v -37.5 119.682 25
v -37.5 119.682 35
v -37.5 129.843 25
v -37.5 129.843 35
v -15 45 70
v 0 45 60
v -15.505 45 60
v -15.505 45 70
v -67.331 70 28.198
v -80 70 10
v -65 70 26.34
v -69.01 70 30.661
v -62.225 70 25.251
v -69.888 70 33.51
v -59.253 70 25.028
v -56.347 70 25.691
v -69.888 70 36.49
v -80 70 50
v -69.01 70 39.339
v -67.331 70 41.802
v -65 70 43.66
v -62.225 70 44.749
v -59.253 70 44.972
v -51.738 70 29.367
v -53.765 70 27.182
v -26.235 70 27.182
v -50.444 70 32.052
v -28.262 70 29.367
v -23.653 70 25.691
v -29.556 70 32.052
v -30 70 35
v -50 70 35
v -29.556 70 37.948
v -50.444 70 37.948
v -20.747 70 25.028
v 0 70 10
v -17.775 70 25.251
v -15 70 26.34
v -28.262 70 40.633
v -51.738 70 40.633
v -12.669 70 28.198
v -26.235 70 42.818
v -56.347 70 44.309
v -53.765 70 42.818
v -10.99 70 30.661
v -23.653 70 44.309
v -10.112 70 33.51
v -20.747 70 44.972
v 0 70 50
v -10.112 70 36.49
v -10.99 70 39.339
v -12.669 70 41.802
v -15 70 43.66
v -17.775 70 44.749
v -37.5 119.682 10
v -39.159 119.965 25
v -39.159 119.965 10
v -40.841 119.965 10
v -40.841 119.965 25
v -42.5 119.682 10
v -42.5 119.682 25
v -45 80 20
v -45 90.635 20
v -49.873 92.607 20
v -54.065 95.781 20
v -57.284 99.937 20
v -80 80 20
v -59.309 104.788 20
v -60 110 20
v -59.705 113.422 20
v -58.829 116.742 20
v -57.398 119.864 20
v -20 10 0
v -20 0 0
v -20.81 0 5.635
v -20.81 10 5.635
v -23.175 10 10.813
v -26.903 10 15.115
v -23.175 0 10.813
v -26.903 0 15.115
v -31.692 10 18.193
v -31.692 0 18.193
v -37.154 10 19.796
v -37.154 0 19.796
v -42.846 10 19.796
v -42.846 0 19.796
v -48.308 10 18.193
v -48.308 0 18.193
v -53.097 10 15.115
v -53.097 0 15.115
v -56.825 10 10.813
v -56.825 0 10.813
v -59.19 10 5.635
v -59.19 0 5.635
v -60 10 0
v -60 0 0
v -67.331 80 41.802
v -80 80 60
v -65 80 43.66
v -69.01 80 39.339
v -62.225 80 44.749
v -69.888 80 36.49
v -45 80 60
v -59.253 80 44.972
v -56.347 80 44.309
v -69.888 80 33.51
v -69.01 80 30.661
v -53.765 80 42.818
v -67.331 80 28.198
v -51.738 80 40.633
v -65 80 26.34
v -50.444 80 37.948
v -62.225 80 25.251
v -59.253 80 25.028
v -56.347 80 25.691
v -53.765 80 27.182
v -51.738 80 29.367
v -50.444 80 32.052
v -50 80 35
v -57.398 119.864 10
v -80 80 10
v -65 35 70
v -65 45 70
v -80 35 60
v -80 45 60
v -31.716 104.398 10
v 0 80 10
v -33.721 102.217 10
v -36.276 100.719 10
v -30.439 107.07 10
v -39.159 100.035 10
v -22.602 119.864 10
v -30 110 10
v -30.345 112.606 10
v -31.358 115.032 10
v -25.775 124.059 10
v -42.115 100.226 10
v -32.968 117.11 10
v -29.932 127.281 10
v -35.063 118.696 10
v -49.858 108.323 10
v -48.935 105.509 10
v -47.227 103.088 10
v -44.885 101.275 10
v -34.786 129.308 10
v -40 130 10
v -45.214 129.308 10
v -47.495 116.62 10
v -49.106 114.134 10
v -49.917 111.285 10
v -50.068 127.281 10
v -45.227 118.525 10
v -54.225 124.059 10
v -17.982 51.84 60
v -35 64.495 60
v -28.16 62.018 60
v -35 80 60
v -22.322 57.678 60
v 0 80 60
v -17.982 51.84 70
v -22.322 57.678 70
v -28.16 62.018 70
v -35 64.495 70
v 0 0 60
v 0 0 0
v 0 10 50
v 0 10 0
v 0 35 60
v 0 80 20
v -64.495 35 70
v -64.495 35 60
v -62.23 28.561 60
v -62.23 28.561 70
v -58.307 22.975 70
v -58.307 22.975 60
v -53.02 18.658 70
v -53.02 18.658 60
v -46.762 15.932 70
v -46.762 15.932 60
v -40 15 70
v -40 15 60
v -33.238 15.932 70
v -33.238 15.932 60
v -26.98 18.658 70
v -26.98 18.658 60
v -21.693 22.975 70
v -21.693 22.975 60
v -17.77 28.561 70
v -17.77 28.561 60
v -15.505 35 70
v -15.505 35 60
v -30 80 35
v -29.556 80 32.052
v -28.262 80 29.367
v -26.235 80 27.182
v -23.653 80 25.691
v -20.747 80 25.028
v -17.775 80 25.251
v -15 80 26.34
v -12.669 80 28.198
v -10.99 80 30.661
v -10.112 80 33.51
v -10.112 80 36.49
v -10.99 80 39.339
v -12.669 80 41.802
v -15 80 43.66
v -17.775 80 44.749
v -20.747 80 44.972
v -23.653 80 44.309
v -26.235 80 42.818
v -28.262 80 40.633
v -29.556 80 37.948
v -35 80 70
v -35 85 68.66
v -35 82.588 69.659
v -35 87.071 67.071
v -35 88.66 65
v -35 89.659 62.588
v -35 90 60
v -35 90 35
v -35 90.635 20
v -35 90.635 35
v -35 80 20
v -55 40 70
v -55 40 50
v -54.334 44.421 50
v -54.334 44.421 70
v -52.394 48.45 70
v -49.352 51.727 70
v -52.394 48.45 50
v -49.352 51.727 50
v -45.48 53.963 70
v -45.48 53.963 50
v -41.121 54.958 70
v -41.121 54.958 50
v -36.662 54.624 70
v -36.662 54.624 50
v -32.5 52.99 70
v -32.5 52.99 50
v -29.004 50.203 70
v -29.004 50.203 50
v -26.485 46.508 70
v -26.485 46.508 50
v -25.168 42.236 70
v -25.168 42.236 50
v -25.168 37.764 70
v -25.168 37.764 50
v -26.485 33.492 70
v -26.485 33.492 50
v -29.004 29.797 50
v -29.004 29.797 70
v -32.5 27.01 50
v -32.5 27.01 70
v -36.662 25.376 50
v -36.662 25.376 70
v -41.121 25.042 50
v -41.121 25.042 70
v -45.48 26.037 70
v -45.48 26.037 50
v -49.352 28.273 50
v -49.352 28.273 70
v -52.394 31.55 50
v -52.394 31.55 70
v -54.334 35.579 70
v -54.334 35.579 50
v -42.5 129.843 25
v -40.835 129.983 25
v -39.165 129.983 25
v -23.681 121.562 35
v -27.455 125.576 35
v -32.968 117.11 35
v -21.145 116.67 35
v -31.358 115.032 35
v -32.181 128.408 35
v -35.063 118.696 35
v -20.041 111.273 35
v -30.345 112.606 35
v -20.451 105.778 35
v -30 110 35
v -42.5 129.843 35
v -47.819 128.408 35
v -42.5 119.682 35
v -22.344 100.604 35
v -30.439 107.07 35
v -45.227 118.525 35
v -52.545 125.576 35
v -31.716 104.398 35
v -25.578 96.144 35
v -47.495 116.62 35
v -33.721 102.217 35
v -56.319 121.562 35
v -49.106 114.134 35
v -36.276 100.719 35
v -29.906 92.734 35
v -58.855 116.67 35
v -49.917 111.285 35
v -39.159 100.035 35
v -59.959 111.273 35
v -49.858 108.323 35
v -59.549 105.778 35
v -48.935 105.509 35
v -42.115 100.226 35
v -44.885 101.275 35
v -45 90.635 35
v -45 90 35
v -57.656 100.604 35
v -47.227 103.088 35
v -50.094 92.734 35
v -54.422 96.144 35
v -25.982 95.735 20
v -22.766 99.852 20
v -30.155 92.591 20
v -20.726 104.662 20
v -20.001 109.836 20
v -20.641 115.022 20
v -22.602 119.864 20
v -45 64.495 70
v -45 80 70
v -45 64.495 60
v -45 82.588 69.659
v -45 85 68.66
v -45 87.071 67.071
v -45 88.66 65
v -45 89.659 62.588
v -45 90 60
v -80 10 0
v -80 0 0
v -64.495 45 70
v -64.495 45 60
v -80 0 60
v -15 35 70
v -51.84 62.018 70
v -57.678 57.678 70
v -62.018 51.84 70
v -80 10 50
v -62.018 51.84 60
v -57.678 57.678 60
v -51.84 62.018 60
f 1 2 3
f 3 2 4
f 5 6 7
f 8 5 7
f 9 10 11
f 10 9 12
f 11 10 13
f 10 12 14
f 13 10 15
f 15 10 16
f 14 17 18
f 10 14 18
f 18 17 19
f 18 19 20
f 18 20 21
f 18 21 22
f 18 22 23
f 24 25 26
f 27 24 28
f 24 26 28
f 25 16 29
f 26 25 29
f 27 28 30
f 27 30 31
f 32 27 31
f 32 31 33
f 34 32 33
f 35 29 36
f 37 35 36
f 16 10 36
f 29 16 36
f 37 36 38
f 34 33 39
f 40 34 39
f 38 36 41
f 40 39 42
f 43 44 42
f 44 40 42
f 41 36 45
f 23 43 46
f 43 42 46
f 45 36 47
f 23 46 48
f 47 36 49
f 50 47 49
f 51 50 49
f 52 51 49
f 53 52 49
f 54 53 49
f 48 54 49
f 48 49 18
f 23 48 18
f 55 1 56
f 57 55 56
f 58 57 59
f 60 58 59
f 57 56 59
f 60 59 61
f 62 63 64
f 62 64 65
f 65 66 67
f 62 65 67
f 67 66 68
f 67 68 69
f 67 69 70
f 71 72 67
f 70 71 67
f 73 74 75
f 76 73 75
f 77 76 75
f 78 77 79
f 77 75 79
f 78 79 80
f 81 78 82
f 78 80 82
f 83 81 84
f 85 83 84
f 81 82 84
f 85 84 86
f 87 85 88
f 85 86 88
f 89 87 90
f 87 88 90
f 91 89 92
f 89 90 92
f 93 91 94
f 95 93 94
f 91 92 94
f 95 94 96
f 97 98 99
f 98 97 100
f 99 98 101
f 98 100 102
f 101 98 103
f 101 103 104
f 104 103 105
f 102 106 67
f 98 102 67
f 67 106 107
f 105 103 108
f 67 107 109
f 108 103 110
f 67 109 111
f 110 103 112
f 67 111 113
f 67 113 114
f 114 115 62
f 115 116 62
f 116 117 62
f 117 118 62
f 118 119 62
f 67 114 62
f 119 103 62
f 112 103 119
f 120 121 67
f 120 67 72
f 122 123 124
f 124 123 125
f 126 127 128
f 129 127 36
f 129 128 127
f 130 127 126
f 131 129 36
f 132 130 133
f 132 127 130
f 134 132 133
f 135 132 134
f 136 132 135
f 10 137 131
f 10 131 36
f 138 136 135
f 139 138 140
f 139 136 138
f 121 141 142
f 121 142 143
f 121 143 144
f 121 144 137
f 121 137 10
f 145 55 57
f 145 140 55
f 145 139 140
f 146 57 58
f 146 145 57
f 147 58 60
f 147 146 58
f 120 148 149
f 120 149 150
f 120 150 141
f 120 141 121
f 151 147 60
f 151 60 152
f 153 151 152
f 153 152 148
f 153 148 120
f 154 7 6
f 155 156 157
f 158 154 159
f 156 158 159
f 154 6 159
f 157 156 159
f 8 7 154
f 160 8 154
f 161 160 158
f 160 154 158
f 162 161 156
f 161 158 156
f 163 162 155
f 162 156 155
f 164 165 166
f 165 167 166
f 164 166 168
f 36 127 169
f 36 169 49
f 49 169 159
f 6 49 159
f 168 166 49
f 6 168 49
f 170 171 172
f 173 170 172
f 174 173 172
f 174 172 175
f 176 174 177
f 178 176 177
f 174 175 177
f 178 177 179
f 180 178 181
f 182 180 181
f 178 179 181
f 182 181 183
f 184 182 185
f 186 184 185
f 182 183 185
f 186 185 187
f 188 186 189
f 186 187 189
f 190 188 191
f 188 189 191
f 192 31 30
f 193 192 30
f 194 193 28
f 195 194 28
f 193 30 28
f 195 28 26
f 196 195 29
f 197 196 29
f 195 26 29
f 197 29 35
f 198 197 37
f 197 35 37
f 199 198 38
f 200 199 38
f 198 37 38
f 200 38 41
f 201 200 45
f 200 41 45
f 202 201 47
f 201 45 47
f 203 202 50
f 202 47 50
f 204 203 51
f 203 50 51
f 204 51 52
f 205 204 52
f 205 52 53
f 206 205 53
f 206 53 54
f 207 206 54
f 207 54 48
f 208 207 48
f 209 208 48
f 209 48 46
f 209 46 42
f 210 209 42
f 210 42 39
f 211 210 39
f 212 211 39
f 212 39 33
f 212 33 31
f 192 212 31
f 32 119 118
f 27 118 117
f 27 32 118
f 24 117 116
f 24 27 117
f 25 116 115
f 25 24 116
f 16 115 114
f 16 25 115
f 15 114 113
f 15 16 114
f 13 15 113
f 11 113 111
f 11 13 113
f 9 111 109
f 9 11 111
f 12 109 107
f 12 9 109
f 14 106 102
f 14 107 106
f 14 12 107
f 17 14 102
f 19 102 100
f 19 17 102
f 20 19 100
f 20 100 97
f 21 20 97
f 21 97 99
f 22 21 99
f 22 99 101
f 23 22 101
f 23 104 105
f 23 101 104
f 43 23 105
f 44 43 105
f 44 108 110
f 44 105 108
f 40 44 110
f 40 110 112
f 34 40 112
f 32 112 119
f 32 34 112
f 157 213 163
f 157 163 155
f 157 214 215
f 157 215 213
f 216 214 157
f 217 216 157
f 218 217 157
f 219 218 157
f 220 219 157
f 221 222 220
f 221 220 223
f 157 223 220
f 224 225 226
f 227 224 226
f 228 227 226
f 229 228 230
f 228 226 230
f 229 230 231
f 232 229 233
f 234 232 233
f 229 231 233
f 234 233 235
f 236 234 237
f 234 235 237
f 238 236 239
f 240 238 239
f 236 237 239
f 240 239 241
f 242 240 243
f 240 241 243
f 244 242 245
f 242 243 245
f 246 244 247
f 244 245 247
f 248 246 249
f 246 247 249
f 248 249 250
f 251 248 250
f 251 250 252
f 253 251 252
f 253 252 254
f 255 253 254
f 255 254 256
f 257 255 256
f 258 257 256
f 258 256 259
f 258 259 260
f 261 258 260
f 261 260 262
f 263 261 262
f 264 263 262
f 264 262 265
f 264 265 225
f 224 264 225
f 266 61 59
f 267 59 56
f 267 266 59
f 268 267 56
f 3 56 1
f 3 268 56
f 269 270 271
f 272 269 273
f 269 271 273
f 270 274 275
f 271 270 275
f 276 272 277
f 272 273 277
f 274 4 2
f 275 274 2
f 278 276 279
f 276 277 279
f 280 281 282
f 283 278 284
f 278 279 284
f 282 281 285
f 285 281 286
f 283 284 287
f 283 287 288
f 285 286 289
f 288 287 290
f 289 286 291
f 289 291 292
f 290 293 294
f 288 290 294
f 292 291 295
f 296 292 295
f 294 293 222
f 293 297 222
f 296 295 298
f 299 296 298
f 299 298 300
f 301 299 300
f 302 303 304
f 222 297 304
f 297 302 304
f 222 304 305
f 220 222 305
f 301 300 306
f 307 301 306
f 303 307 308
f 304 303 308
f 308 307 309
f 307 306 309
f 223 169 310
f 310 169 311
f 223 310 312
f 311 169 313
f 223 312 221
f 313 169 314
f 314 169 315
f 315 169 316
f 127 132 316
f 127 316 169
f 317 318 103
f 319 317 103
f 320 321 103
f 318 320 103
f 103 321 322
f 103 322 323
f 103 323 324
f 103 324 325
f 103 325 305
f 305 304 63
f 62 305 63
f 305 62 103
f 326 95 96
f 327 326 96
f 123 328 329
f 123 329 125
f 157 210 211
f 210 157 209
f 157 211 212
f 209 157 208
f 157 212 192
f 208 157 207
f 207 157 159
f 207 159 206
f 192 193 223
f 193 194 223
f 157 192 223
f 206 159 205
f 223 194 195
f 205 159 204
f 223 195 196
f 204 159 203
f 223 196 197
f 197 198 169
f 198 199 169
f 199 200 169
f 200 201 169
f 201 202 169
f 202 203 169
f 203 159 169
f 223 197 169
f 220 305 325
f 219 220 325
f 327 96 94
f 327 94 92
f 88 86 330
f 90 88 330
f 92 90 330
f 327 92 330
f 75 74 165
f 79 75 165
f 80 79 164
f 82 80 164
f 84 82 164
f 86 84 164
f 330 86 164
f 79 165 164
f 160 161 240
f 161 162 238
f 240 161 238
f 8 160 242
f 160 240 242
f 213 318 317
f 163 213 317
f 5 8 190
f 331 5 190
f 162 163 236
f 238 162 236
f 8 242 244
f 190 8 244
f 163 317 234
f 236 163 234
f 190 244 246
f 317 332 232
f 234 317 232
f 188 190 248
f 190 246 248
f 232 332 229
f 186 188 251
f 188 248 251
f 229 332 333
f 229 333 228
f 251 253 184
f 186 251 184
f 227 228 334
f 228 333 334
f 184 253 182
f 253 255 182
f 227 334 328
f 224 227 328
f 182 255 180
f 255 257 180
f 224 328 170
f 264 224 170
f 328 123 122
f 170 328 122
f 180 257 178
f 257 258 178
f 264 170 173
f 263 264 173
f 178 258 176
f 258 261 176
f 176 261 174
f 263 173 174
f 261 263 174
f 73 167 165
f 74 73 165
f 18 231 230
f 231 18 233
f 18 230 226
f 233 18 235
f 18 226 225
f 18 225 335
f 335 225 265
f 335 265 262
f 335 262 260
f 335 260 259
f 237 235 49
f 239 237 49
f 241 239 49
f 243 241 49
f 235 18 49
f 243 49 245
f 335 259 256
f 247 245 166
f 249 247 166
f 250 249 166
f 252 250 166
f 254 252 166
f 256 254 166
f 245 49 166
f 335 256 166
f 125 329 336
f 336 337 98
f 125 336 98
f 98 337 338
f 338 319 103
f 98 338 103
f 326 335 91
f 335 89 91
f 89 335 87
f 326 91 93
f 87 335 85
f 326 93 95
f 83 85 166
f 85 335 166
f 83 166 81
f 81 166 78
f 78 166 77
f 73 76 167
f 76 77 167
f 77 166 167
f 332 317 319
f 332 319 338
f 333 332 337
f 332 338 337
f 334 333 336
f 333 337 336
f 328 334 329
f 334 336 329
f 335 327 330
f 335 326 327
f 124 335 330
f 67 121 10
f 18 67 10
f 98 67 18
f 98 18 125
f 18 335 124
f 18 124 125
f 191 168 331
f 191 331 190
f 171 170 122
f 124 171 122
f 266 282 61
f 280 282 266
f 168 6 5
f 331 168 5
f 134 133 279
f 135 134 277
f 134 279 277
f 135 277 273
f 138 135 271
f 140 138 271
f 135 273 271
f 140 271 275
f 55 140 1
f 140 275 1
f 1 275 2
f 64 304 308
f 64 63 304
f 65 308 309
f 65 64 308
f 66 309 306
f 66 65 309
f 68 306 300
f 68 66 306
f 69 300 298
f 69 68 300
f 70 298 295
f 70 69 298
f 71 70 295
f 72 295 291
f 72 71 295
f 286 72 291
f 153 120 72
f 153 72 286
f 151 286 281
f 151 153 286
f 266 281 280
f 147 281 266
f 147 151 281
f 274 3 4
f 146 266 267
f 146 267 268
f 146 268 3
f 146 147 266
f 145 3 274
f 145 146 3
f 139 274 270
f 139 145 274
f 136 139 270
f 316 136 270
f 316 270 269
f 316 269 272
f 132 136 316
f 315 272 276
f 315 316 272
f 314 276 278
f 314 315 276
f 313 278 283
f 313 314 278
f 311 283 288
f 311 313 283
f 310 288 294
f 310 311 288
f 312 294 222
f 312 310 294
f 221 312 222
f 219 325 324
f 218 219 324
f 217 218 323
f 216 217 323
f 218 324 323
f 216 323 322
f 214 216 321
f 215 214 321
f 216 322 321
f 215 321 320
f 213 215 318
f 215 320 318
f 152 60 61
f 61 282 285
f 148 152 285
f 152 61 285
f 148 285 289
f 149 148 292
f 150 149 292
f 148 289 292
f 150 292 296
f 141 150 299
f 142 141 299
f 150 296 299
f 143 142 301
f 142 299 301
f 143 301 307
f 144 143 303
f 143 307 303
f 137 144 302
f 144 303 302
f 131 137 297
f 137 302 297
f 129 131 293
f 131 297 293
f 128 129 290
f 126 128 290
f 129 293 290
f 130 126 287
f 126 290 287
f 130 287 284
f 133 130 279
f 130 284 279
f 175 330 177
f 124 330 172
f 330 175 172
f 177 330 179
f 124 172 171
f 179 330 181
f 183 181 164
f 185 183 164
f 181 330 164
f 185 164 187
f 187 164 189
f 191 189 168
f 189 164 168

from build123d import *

# Parameters (mm, degrees)
EXTRUDE_THIN1_DEPTH = 80
BOSS_EXTRUDE1_DEPTH = 10
SKETCH2_3_R         = 20
BOSS_EXTRUDE2_DEPTH = 25
CUT_EXTRUDE1_REACH  = 158.605
SKETCH3_3_R         = 10
SKETCH3_3_W         = 5
SKETCH3_3_H         = 10.317541634
CUT_EXTRUDE2_DEPTH  = 10
HOLE1_D             = 40
HOLE1_DEPTH         = 10
SKETCH6_R           = 25
BOSS_EXTRUDE3_DEPTH = 10
RIB17_START         = -5
RIB17_DEPTH         = 10
RIB18_START         = -5
RIB18_DEPTH         = 10
RIB26_START         = -5
RIB26_DEPTH         = 10
HOLE2_D             = 30
HOLE3_D             = 20
HOLE3_DEPTH         = 10


with BuildPart() as part:
    # Sketch1 → Extrude-Thin1 (new body)
    with BuildSketch(Plane(origin=(0, 0, 0), x_dir=(0, 0, -1), z_dir=(1, 0, 0))):
        Polygon((0, 0), (-60, 0), (-60, 80), (-10, 80), (-10, 70), (-50, 70), (-50, 10), (0, 10), align=None)
    extrude(amount=-EXTRUDE_THIN1_DEPTH)

    # Sketch2 → Boss-Extrude1 (add)
    with BuildSketch(Plane(origin=(0, 0, 10), x_dir=(-1, 0, 0), z_dir=(0, 0, -1))):
        with BuildLine():
            Line((40, 80), (80, 80))
            Line((80, 80), (57.398181668, 119.864242224))
            ThreePointArc((57.398181668, 119.864242224), (59.338609482, 115.100802223), (60, 110))
            ThreePointArc((60, 110), (54.142135624, 95.857864376), (40, 90))
            Line((40, 90), (40, 80))
        make_face()
        with BuildLine():
            Line((0, 80), (40, 80))
            Line((40, 80), (40, 90))
            ThreePointArc((40, 90), (22.718726255, 99.932349938), (22.601818332, 119.864242224))
            Line((22.601818332, 119.864242224), (0, 80))
        make_face()
    extrude(amount=-BOSS_EXTRUDE1_DEPTH)

    # Sketch2<3> → Boss-Extrude2 (add)
    with BuildSketch(Plane(origin=(0, 0, 10), x_dir=(-1, 0, 0), z_dir=(0, 0, -1))):
        with Locations((40, 110)):
            Circle(SKETCH2_3_R)
    extrude(amount=-BOSS_EXTRUDE2_DEPTH)

    # Sketch3 → Cut-Extrude1 (cut, up to next)
    with BuildSketch(Plane.XY.offset(35), mode=Mode.PRIVATE) as cut_extrude1_sk1:
        with BuildLine():
            ThreePointArc((-37.5, 119.682458366), (-40, 120), (-42.5, 119.682458366))
            Line((-42.5, 119.682458366), (-37.5, 119.682458366))
        make_face()
    cut_extrude1_tool1 = extrude(cut_extrude1_sk1.sketch, amount=-CUT_EXTRUDE1_REACH, mode=Mode.PRIVATE) & part.part
    # Sketch3 → Cut-Extrude1 (cut, up to next)
    with BuildSketch(Plane.XY.offset(35), mode=Mode.PRIVATE) as cut_extrude1_sk2:
        with BuildLine():
            Line((-37.5, 119.682458366), (-42.5, 119.682458366))
            ThreePointArc((-42.5, 119.682458366), (-46.123724357, 102.09430585), (-30, 110))
            ThreePointArc((-30, 110), (-32.09430585, 116.123724357), (-37.5, 119.682458366))
        make_face()
    cut_extrude1_tool2 = extrude(cut_extrude1_sk2.sketch, amount=-CUT_EXTRUDE1_REACH, mode=Mode.PRIVATE) & part.part
    add(cut_extrude1_tool1.solids().sort_by_distance((-40, 119.809649, 35))[0], mode=Mode.SUBTRACT)
    add(cut_extrude1_tool2.solids().sort_by_distance((-40, 109.96673, 35))[0], mode=Mode.SUBTRACT)

    # Sketch3<3> → Cut-Extrude2 (cut)
    with BuildSketch(Plane.XY.offset(35)):
        with Locations((-40, 110)):
            Circle(SKETCH3_3_R)
        with Locations((-40, 124.841229183)):
            Rectangle(SKETCH3_3_W, SKETCH3_3_H)
    extrude(amount=-CUT_EXTRUDE2_DEPTH, mode=Mode.SUBTRACT)

    # Hole1
    with Locations(Plane(origin=(0, 10, 0), x_dir=(1, 0, 0), z_dir=(0, 1, 0))):
        with Locations((-40, 0)):
            Hole(HOLE1_D / 2, depth=HOLE1_DEPTH)

    # Sketch6 → Boss-Extrude3 (add)
    with BuildSketch(Plane.XY.offset(60)):
        with Locations((-40, 40)):
            Circle(SKETCH6_R)
    extrude(amount=BOSS_EXTRUDE3_DEPTH)

    # Rib17: read off the stored shape, not the designer's step
    # Rib17 outline → Rib17 (add)
    with BuildSketch(Plane(origin=(0, 40, 0), x_dir=(-1, 0, 0), z_dir=(0, -1, 0)).offset(RIB17_START)):
        Polygon((15.505102572, -70), (15.505102572, -60), (0, -60), (15, -70), align=None)
    extrude(amount=RIB17_DEPTH)

    # Rib18: read off the stored shape, not the designer's step
    # Rib18 outline → Rib18 (add)
    with BuildSketch(Plane(origin=(0, 40, 0), x_dir=(-1, 0, 0), z_dir=(0, -1, 0)).offset(RIB18_START)):
        Polygon((80, -60), (64.494897428, -60), (64.494897428, -70), (65, -70), align=None)
    extrude(amount=RIB18_DEPTH)

    # Rib26: read off the stored shape, not the designer's step
    # Rib26 outline → Rib26 (add)
    with BuildSketch(Plane(origin=(-40, 0, 0), x_dir=(0, 0, -1), z_dir=(1, 0, 0)).offset(RIB26_START)):
        with BuildLine():
            Line((-70, 80), (-70, 64.494897428))
            Line((-70, 64.494897428), (-60, 64.494897428))
            Line((-60, 64.494897428), (-60, 80))
            Line((-60, 80), (-20, 80))
            Line((-20, 80), (-20, 90.635083269))
            Line((-20, 90.635083269), (-35, 90.635083269))
            Line((-35, 90.635083269), (-35, 90))
            Line((-35, 90), (-60, 90))
            ThreePointArc((-60, 90), (-67.071067812, 87.071067812), (-70, 80))
        make_face()
    extrude(amount=RIB26_DEPTH)

    # Hole2 (through all)
    with Locations(Plane.XY.offset(70)):
        with Locations((-40, 40)):
            Hole(HOLE2_D / 2)

    # Hole3
    with Locations(Plane(origin=(0, 80, 0), x_dir=(1, 0, 0), z_dir=(0, 1, 0))):
        with Locations((-20, -35)):
            hole3 = Hole(HOLE3_D / 2, depth=HOLE3_DEPTH)

    # Mirror1: Hole3 across plane
    add(hole3.mirror(Plane(origin=(-40, 0, 0), x_dir=(0, 0, 1), z_dir=(1, 0, 0))), mode=Mode.SUBTRACT)


solid = part.part
